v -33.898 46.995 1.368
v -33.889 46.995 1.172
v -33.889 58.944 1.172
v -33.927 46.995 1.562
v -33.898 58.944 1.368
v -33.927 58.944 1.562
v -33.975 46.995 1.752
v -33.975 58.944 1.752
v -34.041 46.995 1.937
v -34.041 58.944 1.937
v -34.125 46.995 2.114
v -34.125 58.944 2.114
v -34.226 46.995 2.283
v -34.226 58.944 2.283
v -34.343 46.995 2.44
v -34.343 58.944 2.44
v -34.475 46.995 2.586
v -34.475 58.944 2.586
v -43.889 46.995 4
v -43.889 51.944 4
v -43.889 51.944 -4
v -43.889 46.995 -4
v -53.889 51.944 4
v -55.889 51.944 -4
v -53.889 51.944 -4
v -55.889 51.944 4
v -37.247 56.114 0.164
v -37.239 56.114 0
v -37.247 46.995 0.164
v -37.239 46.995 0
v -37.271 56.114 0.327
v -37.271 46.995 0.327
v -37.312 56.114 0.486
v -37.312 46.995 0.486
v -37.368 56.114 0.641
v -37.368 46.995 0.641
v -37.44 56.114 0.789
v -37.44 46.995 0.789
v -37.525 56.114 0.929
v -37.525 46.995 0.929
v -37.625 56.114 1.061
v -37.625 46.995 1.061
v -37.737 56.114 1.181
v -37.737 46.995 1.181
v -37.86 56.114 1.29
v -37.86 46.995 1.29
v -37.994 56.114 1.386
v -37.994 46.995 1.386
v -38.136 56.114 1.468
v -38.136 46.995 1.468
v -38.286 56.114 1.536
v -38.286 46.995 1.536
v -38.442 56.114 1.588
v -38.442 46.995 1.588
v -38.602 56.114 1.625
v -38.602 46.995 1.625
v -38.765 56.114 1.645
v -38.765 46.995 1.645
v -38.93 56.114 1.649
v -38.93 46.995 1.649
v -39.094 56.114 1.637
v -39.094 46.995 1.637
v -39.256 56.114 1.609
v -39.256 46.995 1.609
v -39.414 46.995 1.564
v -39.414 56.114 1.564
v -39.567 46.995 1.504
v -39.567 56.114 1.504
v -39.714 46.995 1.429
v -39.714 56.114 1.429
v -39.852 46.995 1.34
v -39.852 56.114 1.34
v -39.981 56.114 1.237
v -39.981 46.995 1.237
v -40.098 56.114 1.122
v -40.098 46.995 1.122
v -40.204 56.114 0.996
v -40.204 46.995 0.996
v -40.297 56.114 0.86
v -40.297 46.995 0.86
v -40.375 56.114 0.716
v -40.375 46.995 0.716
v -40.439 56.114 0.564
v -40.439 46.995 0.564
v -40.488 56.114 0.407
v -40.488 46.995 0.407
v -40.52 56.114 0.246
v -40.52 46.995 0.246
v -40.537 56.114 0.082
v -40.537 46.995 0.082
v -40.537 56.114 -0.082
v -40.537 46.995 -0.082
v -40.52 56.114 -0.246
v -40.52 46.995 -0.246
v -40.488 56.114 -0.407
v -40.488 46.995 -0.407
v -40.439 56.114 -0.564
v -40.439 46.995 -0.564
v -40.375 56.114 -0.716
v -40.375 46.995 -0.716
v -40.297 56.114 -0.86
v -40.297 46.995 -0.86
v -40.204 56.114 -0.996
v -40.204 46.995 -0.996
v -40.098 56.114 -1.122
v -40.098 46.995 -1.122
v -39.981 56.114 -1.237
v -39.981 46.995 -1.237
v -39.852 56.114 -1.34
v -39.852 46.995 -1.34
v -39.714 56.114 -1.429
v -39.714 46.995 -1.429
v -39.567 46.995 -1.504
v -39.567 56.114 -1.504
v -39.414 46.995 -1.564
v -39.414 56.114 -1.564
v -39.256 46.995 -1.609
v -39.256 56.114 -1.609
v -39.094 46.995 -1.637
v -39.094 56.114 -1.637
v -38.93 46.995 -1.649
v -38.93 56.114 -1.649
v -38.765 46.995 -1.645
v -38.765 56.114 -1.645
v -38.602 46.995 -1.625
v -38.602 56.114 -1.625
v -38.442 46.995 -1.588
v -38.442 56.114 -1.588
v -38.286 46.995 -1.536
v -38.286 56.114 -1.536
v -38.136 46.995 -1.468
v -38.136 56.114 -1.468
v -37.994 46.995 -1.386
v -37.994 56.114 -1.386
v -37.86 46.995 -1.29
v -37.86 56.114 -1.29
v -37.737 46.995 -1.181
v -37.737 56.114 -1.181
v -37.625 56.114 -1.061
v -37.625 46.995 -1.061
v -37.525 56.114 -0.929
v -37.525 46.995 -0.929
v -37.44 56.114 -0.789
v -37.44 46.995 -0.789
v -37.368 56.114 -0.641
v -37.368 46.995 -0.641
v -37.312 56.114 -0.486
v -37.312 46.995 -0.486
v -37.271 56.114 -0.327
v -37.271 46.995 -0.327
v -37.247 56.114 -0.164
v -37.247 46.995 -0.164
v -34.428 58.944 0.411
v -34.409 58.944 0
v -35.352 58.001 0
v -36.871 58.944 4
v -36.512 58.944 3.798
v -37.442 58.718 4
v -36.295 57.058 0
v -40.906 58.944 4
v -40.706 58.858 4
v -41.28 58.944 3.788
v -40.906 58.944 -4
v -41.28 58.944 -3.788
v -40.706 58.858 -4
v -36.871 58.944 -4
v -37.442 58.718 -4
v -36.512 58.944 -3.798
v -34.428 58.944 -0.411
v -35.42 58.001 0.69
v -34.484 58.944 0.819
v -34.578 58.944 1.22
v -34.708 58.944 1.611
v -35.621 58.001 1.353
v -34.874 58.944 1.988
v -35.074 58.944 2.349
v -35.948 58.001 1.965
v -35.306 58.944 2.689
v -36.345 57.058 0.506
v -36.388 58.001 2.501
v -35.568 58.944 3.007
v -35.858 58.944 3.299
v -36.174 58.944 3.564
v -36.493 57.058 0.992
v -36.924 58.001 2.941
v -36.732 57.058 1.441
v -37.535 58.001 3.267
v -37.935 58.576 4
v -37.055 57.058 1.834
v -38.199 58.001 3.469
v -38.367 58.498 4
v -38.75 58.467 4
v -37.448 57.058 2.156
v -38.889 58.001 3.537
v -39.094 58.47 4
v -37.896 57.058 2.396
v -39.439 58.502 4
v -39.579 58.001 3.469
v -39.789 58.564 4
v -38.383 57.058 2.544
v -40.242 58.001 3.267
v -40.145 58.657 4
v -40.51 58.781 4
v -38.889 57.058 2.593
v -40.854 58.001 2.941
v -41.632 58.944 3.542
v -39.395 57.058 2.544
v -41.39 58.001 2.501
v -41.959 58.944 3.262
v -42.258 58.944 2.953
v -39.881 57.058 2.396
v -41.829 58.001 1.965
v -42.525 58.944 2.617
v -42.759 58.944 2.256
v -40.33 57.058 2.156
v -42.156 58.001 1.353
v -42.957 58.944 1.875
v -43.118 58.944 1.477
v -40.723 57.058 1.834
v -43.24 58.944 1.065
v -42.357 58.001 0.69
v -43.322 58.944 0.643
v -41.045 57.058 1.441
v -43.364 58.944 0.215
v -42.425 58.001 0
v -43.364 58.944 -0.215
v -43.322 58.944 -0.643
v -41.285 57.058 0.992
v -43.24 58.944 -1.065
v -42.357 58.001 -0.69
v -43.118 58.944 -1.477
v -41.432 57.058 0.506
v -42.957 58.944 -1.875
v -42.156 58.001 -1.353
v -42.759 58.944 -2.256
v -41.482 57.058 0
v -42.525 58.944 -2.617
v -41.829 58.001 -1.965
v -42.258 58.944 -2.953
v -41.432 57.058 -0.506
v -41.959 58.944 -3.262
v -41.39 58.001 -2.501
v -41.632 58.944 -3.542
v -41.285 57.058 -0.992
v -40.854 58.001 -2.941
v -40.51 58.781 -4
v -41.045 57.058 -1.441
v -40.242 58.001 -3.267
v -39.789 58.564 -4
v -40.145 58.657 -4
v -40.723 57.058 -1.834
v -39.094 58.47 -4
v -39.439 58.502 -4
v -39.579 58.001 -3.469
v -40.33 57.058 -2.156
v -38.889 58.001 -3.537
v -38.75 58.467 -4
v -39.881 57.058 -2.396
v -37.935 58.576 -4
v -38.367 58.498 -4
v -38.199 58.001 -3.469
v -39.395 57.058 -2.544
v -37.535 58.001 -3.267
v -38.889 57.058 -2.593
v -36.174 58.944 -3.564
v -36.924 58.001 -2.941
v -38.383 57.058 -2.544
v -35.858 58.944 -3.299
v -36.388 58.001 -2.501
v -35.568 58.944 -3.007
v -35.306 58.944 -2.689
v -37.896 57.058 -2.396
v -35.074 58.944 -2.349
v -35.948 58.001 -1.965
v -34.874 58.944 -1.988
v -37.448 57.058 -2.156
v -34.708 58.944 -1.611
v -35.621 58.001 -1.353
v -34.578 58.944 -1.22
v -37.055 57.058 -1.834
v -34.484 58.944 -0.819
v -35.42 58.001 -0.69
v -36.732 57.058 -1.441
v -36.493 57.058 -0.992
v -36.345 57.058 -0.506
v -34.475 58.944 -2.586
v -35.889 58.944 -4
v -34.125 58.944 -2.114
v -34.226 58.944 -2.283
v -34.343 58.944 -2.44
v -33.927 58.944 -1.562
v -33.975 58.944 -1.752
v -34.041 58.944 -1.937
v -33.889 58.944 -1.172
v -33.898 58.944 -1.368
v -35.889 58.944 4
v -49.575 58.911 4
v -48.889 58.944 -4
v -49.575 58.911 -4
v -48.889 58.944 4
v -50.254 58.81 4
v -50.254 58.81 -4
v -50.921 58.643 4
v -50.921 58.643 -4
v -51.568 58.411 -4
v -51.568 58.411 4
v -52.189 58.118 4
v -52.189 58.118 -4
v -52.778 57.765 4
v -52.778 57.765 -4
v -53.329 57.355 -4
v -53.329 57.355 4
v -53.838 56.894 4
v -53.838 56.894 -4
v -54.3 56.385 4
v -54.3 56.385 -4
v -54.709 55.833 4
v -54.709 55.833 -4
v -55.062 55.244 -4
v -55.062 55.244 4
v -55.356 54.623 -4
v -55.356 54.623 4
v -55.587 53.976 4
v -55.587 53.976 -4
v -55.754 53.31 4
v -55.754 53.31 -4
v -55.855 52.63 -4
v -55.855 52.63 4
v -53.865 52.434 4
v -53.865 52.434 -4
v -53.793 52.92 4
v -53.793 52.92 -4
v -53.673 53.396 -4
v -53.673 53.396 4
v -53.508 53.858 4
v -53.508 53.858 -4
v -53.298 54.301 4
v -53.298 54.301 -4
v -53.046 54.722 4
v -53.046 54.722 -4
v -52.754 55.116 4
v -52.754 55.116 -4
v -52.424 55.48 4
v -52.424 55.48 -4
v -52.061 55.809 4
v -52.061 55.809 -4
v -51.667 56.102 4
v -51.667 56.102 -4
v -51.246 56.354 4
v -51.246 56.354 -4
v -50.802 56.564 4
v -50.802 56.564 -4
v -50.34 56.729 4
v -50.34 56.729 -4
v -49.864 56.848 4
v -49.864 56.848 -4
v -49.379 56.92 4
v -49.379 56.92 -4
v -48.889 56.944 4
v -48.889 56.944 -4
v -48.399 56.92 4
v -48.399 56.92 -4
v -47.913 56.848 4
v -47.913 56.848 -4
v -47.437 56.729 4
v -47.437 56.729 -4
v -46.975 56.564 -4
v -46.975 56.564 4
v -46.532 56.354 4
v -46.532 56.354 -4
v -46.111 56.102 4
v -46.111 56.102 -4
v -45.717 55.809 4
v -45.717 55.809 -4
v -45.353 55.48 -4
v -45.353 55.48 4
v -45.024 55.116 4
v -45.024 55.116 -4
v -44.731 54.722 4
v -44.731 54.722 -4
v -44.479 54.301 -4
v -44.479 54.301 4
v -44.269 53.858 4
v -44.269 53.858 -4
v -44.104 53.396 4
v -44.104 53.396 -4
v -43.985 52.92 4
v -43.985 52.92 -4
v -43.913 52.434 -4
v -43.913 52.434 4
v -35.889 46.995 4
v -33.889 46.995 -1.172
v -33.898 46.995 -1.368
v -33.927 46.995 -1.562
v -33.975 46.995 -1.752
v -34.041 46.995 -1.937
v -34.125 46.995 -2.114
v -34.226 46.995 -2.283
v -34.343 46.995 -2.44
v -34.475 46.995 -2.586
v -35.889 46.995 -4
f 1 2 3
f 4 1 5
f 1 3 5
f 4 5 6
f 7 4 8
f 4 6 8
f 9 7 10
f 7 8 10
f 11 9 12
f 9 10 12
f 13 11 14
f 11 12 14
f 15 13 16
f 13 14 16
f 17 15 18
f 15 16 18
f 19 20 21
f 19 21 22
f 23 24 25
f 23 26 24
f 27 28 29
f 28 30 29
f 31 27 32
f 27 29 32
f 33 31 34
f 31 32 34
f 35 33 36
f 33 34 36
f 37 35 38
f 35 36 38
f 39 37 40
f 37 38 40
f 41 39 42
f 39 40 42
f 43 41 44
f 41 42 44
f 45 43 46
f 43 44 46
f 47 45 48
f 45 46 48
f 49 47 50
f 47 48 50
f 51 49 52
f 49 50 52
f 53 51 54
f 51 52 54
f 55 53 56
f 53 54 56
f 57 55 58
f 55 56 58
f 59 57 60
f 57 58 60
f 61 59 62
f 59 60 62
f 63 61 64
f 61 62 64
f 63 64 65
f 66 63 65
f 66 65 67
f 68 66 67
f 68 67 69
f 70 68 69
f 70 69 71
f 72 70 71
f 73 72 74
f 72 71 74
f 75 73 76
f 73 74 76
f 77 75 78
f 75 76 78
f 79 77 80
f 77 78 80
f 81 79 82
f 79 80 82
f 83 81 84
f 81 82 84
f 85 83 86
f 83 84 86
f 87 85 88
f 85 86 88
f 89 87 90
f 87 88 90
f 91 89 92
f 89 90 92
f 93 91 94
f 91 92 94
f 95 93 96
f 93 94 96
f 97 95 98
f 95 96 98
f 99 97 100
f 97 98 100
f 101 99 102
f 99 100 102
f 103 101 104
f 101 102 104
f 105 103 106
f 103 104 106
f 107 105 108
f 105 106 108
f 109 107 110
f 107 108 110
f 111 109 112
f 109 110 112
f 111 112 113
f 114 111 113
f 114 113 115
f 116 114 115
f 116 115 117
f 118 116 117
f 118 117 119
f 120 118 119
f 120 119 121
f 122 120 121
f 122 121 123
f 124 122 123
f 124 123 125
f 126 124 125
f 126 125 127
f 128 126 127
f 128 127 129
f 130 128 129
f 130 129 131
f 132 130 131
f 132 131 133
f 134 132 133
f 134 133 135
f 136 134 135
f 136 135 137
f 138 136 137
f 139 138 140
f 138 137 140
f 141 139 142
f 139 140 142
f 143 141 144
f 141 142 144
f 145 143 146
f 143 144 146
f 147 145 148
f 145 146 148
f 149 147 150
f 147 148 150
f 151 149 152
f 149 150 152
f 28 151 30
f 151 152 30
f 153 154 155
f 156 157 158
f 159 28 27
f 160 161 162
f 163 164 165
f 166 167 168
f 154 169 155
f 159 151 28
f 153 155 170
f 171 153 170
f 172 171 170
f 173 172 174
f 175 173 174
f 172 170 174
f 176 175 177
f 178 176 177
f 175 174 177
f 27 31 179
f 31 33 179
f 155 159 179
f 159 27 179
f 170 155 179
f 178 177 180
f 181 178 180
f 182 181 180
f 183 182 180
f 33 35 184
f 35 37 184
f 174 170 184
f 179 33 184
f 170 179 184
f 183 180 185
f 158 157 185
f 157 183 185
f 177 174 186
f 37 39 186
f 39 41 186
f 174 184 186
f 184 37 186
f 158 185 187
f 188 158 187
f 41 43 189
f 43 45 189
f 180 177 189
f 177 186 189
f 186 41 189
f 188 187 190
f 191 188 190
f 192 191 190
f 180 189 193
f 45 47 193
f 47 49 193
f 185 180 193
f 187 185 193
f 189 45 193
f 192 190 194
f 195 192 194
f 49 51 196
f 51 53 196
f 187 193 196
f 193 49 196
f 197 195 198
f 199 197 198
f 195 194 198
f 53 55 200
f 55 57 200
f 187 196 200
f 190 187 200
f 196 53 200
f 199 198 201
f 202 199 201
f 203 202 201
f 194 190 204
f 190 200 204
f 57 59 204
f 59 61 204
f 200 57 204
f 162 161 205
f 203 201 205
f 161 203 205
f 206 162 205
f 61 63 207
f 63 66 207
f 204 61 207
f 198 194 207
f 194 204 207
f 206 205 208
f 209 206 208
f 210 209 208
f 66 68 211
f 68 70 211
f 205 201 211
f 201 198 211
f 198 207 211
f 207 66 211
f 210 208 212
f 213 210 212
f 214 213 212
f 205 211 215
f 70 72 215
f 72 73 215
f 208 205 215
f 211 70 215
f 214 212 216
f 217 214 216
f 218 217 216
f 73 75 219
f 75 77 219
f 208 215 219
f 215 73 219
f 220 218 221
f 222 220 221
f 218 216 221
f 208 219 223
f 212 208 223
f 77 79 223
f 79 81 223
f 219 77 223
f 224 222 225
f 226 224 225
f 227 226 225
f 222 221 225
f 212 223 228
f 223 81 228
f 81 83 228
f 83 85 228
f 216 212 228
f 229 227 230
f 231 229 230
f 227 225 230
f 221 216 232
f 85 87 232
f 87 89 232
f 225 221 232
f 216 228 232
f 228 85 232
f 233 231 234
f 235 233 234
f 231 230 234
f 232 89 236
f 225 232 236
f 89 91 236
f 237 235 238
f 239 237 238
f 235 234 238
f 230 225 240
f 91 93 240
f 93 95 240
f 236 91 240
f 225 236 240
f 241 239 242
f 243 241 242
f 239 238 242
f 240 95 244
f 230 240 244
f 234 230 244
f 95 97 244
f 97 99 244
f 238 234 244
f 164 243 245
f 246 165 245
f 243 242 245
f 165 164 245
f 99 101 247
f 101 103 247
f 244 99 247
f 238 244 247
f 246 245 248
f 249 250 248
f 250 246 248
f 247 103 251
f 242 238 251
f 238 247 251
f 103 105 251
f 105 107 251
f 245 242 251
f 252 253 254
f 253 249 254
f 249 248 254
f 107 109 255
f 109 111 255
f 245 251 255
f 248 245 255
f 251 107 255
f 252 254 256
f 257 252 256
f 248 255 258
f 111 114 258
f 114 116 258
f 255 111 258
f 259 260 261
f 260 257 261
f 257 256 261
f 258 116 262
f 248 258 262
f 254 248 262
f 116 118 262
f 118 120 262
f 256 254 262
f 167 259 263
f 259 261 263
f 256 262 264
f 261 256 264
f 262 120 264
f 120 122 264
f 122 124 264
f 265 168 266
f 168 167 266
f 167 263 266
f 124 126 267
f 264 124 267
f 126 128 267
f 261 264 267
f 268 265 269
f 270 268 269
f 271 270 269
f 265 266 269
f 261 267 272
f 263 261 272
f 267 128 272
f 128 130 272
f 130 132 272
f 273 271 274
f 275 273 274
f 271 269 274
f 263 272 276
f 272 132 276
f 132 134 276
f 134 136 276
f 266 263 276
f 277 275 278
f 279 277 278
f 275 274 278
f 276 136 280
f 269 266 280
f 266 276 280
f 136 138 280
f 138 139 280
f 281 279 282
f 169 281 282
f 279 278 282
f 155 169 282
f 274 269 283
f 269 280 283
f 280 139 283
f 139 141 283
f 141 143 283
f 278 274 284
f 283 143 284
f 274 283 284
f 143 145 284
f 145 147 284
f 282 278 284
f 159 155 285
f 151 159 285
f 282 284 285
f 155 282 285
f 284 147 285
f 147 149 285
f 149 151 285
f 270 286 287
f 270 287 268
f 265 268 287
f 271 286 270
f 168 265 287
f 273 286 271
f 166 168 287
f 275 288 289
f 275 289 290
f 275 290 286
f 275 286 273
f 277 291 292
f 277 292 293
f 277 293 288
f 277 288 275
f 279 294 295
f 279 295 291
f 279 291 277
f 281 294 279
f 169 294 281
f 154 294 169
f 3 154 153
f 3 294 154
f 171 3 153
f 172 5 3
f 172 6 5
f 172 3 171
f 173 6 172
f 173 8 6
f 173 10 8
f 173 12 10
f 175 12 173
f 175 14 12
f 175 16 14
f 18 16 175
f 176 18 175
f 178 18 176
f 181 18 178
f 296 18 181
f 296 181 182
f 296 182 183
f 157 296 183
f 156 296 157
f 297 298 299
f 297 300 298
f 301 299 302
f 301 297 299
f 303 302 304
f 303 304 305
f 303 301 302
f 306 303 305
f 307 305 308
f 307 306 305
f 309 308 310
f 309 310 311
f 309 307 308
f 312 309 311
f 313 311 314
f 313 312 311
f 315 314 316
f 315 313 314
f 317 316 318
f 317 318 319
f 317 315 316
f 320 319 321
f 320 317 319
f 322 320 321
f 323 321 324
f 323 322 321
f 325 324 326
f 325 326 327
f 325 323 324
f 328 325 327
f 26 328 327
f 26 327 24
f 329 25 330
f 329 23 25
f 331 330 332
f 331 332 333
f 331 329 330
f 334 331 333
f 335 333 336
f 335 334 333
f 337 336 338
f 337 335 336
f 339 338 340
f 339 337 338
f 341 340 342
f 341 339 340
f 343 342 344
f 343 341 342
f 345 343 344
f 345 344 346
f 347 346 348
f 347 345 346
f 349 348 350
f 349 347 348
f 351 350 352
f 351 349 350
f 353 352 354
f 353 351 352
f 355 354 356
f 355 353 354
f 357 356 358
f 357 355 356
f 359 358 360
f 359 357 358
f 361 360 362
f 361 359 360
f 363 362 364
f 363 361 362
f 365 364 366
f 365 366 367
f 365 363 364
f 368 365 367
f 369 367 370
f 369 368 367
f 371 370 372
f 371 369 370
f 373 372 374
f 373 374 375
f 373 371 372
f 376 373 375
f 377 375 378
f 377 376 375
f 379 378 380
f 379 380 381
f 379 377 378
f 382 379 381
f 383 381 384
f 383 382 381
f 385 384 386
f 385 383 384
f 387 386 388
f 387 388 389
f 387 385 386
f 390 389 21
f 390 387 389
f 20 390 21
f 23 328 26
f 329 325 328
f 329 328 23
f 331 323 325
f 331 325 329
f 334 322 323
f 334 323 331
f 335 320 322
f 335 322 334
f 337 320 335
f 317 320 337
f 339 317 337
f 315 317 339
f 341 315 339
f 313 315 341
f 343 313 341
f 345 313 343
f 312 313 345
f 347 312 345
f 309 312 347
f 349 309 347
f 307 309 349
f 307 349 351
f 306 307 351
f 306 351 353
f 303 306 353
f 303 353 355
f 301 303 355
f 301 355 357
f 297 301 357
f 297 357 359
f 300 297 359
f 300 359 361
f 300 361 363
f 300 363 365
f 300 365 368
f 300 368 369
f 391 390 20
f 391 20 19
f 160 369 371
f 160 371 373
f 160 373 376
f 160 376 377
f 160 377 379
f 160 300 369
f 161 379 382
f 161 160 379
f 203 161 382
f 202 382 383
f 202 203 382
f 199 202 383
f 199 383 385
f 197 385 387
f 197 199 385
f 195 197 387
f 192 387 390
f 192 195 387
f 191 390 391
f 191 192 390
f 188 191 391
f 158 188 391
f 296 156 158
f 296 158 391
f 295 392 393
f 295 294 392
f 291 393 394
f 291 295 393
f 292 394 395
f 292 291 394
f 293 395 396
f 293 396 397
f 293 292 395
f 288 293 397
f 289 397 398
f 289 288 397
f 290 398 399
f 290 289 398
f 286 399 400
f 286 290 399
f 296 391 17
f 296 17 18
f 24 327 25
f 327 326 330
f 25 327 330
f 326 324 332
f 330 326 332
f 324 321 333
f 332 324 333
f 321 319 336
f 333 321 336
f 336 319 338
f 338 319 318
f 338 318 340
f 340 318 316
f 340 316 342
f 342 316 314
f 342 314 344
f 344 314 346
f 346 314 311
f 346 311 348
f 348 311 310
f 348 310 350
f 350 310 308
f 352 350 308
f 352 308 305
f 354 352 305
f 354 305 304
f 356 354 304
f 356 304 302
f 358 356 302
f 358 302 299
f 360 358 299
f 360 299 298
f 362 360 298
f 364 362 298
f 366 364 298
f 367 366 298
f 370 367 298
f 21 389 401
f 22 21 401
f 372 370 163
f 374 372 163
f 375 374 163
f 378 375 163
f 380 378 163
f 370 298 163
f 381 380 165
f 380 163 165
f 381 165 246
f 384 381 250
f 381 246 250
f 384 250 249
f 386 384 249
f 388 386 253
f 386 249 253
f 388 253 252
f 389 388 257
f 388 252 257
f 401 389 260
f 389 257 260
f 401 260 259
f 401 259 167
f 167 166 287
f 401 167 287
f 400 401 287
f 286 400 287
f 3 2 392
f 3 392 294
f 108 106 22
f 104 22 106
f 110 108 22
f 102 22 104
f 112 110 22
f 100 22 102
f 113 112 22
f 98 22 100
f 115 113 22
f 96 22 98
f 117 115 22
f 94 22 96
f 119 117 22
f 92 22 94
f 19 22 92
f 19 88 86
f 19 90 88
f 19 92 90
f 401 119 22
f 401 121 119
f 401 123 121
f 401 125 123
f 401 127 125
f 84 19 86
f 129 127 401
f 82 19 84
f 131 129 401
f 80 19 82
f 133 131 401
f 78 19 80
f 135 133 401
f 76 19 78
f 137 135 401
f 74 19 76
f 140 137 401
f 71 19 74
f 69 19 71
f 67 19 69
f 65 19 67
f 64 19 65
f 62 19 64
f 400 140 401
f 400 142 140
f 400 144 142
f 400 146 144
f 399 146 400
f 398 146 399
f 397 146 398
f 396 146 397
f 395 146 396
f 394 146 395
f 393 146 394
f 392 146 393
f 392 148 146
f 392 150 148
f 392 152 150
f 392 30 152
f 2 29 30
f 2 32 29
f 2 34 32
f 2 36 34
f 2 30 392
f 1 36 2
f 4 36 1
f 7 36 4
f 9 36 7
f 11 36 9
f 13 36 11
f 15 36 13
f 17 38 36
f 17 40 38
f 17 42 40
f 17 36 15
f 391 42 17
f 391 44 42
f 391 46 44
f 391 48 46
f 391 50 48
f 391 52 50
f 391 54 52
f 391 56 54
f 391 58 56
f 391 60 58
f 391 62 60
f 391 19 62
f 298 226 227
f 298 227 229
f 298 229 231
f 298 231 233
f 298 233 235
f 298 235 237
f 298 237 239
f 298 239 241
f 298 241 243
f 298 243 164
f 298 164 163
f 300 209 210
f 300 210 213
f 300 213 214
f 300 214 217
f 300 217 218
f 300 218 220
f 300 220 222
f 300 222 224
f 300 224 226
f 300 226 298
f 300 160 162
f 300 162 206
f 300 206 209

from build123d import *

# Parameters (mm, degrees)
F1_DEPTH       = 4
F3_D           = 3.3
F3_CSINK_D     = 8.96
F3_CSINK_ANGLE = 90
F4_SIZE        = 2
F5_R           = 2


with BuildPart() as f1:
    # F0 (on Top) → F1 (new body, symmetric)
    with BuildSketch(Plane.XY):
        with BuildLine():
            ThreePointArc((-53.8887429237, 51.9443377852), (-48.8887429237, 56.9443377852), (-43.8887429237, 51.9443377852))
            Line((-43.8887429237, 51.9443377852), (-43.8887429237, 46.9949170947))
            Line((-43.8887429237, 46.9949170947), (-33.8887429237, 46.9949170947))
            Line((-33.8887429237, 46.9949170947), (-33.8887429237, 58.9443377852))
            Line((-33.8887429237, 58.9443377852), (-48.8887429237, 58.9443377852))
            ThreePointArc((-48.8887429237, 58.9443377852), (-53.838490392, 56.8940852535), (-55.8887429237, 51.9443377852))
            Line((-55.8887429237, 51.9443377852), (-53.8887429237, 51.9443377852))
        make_face()
    extrude(amount=F1_DEPTH, both=True)

    # F3 (through all)
    with Locations(Plane(origin=(0, 58.9443377852, 0), x_dir=(-1, 0, 0), z_dir=(0, 1, 0))):
        with Locations((38.8887429237, 0)):
            CounterSinkHole(F3_D / 2, F3_CSINK_D / 2, counter_sink_angle=F3_CSINK_ANGLE)

    # F4
    f4_edges = [f1.edges().sort_by_distance(p)[0] for p in [
        (-33.888743, 52.969627, -4),
        (-33.888743, 52.969627, 4),
    ]]
    chamfer(f4_edges, length=F4_SIZE)

    # F5
    f5_edges = [f1.edges().sort_by_distance(p)[0] for p in [
        (-33.888743, 52.969627, 2),
        (-33.888743, 52.969627, -2),
    ]]
    fillet(f5_edges, radius=F5_R)


solid = f1.part
